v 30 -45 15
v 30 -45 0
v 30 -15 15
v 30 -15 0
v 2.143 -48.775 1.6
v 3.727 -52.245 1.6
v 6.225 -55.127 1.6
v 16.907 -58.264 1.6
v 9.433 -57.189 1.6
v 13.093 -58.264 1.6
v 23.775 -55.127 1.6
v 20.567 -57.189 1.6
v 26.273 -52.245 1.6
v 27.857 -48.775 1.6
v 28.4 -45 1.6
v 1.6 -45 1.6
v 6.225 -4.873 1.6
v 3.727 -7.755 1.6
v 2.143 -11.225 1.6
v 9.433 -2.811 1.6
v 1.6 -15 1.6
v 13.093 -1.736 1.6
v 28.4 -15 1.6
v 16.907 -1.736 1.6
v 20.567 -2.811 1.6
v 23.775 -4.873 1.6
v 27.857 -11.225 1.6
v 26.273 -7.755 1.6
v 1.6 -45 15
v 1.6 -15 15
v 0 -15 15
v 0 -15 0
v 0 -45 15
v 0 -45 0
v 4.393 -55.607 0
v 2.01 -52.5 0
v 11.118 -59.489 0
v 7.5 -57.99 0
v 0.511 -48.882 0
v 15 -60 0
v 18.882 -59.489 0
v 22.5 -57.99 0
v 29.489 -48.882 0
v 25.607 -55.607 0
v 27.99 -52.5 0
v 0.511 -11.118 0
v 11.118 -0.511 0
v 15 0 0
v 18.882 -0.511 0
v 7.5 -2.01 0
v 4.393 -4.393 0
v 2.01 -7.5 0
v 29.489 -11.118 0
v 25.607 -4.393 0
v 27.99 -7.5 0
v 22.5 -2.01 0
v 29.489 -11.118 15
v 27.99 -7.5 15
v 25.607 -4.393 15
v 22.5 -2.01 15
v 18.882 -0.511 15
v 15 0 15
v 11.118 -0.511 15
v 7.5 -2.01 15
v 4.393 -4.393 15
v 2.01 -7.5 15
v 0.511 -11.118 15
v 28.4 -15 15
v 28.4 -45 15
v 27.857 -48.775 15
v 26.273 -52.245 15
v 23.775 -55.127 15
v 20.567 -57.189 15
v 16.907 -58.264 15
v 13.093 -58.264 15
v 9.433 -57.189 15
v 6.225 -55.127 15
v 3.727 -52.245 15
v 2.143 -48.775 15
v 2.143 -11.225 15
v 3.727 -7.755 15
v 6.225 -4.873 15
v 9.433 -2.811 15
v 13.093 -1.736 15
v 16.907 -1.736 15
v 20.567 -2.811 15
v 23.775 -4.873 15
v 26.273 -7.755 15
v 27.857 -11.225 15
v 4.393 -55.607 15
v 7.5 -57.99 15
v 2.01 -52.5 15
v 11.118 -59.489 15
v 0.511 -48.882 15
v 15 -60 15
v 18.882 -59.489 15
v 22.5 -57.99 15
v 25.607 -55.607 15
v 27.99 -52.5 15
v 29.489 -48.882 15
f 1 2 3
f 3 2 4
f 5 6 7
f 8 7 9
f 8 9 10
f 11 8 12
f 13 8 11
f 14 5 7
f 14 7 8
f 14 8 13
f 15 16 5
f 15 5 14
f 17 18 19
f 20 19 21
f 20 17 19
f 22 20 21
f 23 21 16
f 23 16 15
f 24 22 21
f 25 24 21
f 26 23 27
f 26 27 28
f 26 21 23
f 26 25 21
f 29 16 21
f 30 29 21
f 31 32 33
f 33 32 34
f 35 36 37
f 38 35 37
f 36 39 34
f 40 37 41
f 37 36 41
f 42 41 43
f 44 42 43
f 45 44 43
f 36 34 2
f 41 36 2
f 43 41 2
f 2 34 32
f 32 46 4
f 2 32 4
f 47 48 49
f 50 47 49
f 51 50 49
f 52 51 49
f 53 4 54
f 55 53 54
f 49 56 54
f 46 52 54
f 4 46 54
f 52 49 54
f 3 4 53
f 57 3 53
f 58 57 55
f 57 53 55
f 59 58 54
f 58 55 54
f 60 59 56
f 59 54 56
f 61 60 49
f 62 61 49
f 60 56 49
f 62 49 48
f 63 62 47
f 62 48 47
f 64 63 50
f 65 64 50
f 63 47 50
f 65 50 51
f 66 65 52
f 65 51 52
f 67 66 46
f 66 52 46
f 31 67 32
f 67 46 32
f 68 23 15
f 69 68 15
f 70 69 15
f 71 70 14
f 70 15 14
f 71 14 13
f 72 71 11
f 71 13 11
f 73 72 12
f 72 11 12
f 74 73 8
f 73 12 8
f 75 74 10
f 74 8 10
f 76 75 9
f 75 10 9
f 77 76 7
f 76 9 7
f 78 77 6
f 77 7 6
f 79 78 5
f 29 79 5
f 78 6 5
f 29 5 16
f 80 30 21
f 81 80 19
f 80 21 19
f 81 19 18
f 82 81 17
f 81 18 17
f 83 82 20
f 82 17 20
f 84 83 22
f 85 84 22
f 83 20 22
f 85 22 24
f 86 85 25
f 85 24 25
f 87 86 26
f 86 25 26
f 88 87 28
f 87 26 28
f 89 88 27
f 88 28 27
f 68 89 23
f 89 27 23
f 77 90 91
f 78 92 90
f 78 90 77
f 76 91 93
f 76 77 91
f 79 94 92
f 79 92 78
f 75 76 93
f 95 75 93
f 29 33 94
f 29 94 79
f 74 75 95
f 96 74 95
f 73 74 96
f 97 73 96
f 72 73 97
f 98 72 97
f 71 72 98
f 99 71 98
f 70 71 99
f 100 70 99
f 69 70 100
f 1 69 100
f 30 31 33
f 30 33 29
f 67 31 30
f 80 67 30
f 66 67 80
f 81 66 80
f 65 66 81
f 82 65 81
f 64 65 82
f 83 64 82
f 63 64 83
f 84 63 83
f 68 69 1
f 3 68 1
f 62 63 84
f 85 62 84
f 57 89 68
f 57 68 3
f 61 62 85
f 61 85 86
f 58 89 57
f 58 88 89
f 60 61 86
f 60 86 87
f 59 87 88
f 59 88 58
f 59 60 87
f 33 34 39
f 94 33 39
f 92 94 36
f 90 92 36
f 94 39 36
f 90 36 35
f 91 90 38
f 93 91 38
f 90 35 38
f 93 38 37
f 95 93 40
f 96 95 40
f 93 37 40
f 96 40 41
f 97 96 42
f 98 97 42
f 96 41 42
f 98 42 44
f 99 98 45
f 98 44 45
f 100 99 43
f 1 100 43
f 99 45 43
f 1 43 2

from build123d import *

# Parameters (mm, degrees)
F1_DEPTH = 15
F0_W     = 26.8
F0_H     = 30
F2_DEPTH = 1.6


# Not quite as in the source:
# - a feature names something its author has since deleted; it is built from what else it names


with BuildPart() as f1:
    # F0 (on Top) → F1 (new body)
    with BuildSketch(Plane.XY):
        with BuildLine():
            ThreePointArc((30, -15), (25.6066017178, -4.3933982822), (15, 0))
            ThreePointArc((15, 0), (4.3933982822, -4.3933982822), (0, -15))
            Line((0, -15), (0, -45))
            Line((0, -45), (1.6, -45))
            Line((1.6, -45), (1.6, -15))
            ThreePointArc((1.6, -15), (15, -1.6), (28.4, -15))
            Line((28.4, -15), (28.4, -45))
            Line((28.4, -45), (30, -45))
            Line((30, -45), (30, -15))
        make_face()
        with BuildLine():
            Line((1.6, -45), (0, -45))
            ThreePointArc((0, -45), (4.3933982822, -55.6066017178), (15, -60))
            ThreePointArc((15, -60), (25.6066017178, -55.6066017178), (30, -45))
            Line((30, -45), (28.4, -45))
            ThreePointArc((28.4, -45), (15, -58.4), (1.6, -45))
        make_face()
    extrude(amount=F1_DEPTH)

    # F0 (on Top) → F2 (join)
    with BuildSketch(Plane.XY):
        with BuildLine():
            ThreePointArc((28.4, -15), (15, -1.6), (1.6, -15))
            Line((1.6, -15), (28.4, -15))
        make_face()
        with BuildLine():
            Line((28.4, -45), (1.6, -45))
            ThreePointArc((1.6, -45), (15, -58.4), (28.4, -45))
        make_face()
        with Locations((15, -30)):
            Rectangle(F0_W, F0_H)
    extrude(amount=F2_DEPTH)


solid = f1.part
